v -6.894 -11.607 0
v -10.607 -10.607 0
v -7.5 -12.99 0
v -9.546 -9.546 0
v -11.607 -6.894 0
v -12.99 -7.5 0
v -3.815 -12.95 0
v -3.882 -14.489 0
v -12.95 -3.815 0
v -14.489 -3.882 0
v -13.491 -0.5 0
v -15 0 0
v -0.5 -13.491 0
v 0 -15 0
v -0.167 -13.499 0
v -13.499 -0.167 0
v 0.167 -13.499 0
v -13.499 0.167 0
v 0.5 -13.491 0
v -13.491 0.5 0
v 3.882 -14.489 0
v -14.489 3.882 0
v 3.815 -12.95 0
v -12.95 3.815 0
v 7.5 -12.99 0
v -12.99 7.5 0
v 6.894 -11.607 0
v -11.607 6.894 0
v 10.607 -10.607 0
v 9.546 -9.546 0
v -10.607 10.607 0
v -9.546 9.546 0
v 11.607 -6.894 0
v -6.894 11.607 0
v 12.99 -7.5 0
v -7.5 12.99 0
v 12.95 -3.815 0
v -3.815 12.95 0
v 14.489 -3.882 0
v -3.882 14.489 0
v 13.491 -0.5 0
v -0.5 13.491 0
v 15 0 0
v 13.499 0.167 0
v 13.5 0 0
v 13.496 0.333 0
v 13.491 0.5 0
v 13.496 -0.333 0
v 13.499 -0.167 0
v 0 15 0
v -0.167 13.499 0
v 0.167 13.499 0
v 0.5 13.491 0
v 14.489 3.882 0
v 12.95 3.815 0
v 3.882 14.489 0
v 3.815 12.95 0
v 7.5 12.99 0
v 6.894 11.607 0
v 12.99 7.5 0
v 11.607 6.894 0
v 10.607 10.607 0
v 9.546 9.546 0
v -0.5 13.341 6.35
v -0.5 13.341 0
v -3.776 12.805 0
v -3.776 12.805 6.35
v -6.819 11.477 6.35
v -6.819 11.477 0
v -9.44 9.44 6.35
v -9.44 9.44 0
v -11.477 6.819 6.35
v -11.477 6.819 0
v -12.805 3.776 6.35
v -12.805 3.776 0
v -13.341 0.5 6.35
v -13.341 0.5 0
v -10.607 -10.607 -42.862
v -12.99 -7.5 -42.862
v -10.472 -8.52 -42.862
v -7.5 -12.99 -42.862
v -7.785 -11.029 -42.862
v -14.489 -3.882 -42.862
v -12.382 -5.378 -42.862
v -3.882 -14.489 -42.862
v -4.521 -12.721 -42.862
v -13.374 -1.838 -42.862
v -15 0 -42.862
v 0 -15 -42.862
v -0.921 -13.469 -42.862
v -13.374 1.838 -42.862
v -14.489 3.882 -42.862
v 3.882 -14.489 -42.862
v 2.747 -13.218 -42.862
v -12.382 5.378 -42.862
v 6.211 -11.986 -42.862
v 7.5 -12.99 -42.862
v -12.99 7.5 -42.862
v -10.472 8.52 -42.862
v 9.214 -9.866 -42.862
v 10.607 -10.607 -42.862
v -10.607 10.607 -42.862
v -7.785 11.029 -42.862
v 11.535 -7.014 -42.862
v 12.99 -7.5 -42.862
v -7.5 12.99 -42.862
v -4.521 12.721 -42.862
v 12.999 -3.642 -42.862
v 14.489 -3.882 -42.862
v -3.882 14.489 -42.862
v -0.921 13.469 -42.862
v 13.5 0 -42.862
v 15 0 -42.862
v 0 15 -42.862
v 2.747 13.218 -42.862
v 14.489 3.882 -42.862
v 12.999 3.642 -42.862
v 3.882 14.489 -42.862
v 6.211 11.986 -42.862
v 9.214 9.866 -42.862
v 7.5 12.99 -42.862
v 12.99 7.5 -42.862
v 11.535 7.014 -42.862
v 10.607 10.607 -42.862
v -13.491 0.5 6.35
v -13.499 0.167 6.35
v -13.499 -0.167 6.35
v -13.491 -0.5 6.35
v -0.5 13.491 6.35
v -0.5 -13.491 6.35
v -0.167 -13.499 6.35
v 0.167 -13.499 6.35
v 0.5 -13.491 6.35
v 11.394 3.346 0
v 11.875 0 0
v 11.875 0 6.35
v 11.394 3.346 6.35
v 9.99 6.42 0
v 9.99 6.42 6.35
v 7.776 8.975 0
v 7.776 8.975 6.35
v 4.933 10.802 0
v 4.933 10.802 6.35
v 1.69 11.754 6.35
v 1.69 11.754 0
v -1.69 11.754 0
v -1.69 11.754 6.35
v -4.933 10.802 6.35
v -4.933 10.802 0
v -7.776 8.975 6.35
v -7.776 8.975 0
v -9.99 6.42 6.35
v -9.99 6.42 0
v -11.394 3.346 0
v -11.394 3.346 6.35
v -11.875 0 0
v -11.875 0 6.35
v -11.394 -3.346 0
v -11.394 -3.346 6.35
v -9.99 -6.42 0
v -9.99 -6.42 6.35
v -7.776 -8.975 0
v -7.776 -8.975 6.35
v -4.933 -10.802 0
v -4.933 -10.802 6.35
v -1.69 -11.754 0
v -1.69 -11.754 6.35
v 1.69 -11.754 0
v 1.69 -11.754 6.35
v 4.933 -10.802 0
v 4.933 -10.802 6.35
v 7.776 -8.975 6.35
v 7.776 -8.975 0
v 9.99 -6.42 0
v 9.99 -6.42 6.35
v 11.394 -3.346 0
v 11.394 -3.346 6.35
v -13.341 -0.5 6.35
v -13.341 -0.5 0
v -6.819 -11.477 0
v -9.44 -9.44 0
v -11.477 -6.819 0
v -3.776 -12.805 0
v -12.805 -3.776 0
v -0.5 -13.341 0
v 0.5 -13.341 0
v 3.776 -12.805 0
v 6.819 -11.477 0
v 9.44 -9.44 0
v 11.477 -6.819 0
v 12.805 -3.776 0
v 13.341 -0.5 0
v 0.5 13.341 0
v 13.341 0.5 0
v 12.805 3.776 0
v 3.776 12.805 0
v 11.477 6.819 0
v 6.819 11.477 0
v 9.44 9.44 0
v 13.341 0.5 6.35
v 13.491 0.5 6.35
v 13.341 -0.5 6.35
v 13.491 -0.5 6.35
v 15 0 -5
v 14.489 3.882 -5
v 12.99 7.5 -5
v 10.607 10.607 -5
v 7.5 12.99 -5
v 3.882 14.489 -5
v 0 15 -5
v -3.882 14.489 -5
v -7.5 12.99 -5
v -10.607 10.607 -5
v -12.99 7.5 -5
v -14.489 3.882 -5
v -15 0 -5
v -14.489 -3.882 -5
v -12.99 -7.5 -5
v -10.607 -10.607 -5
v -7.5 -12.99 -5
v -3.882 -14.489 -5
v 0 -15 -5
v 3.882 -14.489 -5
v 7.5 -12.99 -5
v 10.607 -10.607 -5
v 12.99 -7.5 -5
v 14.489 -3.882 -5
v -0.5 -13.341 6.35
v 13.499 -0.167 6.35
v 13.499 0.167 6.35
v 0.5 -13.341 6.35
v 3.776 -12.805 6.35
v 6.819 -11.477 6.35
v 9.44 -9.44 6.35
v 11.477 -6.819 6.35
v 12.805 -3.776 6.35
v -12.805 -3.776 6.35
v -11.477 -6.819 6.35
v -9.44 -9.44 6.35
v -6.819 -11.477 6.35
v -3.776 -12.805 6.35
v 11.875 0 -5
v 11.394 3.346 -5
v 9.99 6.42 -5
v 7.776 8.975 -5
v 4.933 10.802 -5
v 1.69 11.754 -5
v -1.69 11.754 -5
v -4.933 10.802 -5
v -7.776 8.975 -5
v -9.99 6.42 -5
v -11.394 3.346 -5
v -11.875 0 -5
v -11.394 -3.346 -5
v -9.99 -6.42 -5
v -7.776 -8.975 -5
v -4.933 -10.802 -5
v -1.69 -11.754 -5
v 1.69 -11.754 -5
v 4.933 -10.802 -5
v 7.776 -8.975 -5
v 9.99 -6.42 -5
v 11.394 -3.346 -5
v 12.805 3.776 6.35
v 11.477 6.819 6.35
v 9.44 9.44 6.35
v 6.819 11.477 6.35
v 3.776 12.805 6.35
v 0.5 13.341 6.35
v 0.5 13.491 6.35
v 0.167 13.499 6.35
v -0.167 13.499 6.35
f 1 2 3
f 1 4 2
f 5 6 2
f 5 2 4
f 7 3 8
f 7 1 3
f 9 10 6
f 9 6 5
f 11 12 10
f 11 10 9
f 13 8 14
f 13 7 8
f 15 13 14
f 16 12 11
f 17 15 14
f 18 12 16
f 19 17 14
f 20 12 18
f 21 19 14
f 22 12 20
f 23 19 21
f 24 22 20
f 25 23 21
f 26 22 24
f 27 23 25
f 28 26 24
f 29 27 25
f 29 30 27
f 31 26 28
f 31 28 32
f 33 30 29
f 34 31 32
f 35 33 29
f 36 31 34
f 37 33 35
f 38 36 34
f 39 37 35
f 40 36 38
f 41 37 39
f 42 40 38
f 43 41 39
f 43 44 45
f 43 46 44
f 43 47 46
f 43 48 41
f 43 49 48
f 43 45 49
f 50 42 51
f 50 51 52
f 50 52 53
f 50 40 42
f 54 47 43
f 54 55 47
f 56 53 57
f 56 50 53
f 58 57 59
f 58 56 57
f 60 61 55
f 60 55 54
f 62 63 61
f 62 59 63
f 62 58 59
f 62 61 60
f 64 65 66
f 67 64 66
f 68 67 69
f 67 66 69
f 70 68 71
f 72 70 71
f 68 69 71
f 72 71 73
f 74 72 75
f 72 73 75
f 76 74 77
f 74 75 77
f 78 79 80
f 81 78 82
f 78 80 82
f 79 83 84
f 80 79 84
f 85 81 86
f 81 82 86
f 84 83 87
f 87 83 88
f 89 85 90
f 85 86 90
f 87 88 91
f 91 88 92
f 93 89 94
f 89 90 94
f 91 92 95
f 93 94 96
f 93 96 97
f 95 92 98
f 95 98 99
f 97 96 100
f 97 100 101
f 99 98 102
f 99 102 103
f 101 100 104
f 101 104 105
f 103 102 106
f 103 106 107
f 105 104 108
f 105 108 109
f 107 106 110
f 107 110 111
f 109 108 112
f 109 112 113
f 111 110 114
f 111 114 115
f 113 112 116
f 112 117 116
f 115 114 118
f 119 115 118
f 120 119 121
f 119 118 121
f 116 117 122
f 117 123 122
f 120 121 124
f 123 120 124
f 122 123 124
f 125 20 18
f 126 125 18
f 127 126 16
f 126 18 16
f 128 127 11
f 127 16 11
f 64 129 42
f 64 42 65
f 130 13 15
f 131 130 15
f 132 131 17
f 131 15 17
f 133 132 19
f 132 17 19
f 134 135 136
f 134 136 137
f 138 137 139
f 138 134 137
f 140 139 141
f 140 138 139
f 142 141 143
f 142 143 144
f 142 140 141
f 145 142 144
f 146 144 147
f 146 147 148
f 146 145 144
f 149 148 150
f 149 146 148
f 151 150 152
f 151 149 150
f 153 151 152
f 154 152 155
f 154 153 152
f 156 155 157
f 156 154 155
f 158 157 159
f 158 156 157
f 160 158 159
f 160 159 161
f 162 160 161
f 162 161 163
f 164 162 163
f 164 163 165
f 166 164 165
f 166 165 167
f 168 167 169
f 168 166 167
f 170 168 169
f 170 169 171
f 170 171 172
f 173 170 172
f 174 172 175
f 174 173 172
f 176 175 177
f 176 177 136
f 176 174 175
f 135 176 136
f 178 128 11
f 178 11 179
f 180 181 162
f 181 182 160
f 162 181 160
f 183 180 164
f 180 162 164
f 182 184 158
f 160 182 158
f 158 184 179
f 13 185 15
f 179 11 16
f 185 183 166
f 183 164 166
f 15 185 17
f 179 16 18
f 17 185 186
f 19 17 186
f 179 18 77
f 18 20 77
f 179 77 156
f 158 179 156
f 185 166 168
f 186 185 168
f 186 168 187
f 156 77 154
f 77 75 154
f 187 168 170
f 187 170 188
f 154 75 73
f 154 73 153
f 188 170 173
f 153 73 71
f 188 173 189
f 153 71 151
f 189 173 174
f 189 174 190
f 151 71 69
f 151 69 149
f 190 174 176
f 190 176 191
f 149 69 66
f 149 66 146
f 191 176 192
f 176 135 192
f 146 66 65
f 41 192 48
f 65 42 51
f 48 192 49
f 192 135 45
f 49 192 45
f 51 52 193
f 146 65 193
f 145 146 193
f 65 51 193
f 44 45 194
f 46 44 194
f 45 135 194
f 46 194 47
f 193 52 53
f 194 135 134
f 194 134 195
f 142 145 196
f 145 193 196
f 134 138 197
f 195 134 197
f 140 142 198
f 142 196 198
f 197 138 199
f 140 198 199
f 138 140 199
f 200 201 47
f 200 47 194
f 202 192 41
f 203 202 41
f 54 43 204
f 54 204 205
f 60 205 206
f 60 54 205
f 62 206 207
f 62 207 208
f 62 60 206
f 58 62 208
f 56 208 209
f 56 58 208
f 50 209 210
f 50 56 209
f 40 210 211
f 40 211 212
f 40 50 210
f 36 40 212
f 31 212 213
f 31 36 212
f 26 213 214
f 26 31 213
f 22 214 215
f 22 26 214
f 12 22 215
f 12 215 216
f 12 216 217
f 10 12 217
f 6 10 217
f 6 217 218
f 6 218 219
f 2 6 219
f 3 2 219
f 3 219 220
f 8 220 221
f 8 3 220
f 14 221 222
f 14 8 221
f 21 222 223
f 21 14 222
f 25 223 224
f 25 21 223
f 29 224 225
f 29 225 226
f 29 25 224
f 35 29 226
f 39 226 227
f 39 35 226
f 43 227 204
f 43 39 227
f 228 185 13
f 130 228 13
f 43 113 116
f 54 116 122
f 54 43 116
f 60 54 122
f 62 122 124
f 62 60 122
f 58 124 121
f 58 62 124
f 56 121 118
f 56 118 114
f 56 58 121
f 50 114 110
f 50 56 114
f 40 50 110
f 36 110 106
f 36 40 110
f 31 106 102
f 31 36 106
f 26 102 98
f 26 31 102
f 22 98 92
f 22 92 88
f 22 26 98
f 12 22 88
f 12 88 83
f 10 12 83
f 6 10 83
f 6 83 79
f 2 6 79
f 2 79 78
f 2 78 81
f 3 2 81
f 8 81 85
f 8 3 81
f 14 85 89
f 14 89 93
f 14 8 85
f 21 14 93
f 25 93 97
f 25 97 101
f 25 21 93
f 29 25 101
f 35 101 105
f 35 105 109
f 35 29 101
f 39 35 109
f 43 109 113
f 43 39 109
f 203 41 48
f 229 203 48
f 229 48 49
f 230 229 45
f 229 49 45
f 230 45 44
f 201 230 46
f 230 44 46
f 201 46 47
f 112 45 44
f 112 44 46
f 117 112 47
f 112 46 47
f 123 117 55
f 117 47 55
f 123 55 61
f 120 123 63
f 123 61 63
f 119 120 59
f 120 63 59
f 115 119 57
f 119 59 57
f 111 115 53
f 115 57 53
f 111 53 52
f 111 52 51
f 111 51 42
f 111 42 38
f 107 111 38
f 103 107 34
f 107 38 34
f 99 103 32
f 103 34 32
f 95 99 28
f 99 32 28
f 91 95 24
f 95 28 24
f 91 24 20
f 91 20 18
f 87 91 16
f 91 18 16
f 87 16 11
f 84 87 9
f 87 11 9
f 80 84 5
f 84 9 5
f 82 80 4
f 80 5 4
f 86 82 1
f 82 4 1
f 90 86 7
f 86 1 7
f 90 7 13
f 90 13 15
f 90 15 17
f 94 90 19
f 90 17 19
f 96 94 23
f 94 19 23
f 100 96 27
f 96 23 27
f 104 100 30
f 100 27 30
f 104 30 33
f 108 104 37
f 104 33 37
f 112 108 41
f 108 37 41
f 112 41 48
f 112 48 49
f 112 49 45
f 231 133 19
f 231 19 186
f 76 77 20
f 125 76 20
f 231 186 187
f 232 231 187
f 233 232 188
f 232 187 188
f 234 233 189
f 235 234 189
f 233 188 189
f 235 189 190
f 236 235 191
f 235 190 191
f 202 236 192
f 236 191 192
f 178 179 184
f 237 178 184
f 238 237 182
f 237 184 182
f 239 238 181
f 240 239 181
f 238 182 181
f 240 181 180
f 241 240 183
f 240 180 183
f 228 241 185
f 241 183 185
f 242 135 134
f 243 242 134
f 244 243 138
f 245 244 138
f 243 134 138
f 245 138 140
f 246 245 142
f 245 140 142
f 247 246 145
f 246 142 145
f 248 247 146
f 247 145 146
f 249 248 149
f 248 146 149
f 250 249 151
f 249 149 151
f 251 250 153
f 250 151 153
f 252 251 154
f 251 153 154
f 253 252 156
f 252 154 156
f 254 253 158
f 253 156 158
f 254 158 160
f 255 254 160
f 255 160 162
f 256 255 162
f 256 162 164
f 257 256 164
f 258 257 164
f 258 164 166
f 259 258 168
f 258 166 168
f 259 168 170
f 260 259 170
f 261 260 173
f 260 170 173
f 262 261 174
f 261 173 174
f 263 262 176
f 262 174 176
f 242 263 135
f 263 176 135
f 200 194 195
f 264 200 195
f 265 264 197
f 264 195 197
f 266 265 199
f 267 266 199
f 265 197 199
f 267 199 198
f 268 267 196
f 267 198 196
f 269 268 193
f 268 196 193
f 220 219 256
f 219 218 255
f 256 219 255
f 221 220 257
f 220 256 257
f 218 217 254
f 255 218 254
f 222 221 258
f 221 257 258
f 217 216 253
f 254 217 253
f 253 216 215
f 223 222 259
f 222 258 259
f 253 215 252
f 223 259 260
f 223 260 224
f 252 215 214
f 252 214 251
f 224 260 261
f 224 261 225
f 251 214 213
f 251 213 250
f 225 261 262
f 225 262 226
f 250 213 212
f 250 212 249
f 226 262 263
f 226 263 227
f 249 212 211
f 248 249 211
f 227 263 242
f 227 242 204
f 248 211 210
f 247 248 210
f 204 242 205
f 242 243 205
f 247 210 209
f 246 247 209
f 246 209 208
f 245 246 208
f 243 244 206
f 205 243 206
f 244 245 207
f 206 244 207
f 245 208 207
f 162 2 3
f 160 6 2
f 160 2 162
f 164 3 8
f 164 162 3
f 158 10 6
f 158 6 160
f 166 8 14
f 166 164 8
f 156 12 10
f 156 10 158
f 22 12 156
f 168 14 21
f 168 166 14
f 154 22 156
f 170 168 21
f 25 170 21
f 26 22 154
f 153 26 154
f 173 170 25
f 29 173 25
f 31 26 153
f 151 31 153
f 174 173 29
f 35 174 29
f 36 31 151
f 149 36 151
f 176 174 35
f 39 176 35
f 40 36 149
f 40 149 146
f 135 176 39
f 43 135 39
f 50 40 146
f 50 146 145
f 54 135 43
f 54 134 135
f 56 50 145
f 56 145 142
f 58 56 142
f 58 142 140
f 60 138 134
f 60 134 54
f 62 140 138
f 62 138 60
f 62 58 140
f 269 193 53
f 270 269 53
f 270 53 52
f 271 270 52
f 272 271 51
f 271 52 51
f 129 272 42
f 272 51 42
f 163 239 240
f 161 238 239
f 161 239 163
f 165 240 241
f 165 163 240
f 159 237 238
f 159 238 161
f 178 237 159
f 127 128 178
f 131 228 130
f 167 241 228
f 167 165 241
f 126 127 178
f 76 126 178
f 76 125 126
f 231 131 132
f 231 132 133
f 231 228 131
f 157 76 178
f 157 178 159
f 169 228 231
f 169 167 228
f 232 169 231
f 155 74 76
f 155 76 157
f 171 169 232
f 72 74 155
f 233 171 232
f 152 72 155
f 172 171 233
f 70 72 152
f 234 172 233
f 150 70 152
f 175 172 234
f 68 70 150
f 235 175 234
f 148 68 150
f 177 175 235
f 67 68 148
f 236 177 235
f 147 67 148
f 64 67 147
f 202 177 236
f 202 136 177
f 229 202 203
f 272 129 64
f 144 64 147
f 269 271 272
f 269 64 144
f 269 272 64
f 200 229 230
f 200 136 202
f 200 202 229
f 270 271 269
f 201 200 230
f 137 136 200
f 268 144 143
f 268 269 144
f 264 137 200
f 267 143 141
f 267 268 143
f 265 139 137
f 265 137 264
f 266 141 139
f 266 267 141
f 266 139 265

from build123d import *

# Parameters (mm, degrees)
F0_R     = 11.875
F1_DEPTH = 6.35
F2_R     = 15
F2_R_2   = 13.5
F3_DEPTH = 42.8625
F4_R     = 15
F4_R_2   = 11.875
F5_DEPTH = 5


with BuildPart() as f1:
    # F0 (on Top) → F1 (new body)
    with BuildSketch(Plane.XY):
        with BuildLine():
            ThreePointArc((13.340633, -0.5), (13.347658, -0.250044), (13.35, 0))
            ThreePointArc((13.35, 0), (13.347658, 0.250044), (13.340633, 0.5))
            ThreePointArc((13.340633, 0.5), (9.439876, 9.439876), (0.5, 13.340633))
            ThreePointArc((0.5, 13.340633), (0, 13.35), (-0.5, 13.340633))
            ThreePointArc((-0.5, 13.340633), (-9.439876, 9.439876), (-13.340633, 0.5))
            ThreePointArc((-13.340633, 0.5), (-13.35, 0), (-13.340633, -0.5))
            ThreePointArc((-13.340633, -0.5), (-9.439876, -9.439876), (-0.5, -13.340633))
            ThreePointArc((-0.5, -13.340633), (0, -13.35), (0.5, -13.340633))
            ThreePointArc((0.5, -13.340633), (9.439876, -9.439876), (13.340633, -0.5))
        make_face()
        Circle(F0_R, mode=Mode.SUBTRACT)
        with BuildLine():
            ThreePointArc((13.340633, 0.5), (13.347658, 0.250044), (13.35, 0))
            ThreePointArc((13.35, 0), (13.347658, -0.250044), (13.340633, -0.5))
            Line((13.340633, -0.5), (13.490738, -0.5))
            ThreePointArc((13.490738, -0.5), (13.5, 0), (13.490738, 0.5))
            Line((13.490738, 0.5), (13.340633, 0.5))
        make_face()
        with BuildLine():
            ThreePointArc((-0.5, 13.340633), (0, 13.35), (0.5, 13.340633))
            Line((0.5, 13.340633), (0.5, 13.490738))
            ThreePointArc((0.5, 13.490738), (0, 13.5), (-0.5, 13.490738))
            Line((-0.5, 13.490738), (-0.5, 13.340633))
        make_face()
        with BuildLine():
            Line((0.5, -13.490738), (0.5, -13.340633))
            ThreePointArc((0.5, -13.340633), (0, -13.35), (-0.5, -13.340633))
            Line((-0.5, -13.340633), (-0.5, -13.490738))
            ThreePointArc((-0.5, -13.490738), (0, -13.5), (0.5, -13.490738))
        make_face()
        with BuildLine():
            ThreePointArc((-13.340633, -0.5), (-13.35, 0), (-13.340633, 0.5))
            Line((-13.340633, 0.5), (-13.490738, 0.5))
            ThreePointArc((-13.490738, 0.5), (-13.5, 0), (-13.490738, -0.5))
            Line((-13.490738, -0.5), (-13.340633, -0.5))
        make_face()
    extrude(amount=F1_DEPTH)

    # F2 (on Top) → F3 (join)
    with BuildSketch(Plane.XY):
        Circle(F2_R)
        Circle(F2_R_2, mode=Mode.SUBTRACT)
    extrude(amount=-F3_DEPTH)


with BuildPart() as f5:
    # F4 (on Top) → F5 (new body)
    with BuildSketch(Plane.XY):
        Circle(F4_R)
        Circle(F4_R_2, mode=Mode.SUBTRACT)
    extrude(amount=-F5_DEPTH)


solid = Compound([f1.part, f5.part])
